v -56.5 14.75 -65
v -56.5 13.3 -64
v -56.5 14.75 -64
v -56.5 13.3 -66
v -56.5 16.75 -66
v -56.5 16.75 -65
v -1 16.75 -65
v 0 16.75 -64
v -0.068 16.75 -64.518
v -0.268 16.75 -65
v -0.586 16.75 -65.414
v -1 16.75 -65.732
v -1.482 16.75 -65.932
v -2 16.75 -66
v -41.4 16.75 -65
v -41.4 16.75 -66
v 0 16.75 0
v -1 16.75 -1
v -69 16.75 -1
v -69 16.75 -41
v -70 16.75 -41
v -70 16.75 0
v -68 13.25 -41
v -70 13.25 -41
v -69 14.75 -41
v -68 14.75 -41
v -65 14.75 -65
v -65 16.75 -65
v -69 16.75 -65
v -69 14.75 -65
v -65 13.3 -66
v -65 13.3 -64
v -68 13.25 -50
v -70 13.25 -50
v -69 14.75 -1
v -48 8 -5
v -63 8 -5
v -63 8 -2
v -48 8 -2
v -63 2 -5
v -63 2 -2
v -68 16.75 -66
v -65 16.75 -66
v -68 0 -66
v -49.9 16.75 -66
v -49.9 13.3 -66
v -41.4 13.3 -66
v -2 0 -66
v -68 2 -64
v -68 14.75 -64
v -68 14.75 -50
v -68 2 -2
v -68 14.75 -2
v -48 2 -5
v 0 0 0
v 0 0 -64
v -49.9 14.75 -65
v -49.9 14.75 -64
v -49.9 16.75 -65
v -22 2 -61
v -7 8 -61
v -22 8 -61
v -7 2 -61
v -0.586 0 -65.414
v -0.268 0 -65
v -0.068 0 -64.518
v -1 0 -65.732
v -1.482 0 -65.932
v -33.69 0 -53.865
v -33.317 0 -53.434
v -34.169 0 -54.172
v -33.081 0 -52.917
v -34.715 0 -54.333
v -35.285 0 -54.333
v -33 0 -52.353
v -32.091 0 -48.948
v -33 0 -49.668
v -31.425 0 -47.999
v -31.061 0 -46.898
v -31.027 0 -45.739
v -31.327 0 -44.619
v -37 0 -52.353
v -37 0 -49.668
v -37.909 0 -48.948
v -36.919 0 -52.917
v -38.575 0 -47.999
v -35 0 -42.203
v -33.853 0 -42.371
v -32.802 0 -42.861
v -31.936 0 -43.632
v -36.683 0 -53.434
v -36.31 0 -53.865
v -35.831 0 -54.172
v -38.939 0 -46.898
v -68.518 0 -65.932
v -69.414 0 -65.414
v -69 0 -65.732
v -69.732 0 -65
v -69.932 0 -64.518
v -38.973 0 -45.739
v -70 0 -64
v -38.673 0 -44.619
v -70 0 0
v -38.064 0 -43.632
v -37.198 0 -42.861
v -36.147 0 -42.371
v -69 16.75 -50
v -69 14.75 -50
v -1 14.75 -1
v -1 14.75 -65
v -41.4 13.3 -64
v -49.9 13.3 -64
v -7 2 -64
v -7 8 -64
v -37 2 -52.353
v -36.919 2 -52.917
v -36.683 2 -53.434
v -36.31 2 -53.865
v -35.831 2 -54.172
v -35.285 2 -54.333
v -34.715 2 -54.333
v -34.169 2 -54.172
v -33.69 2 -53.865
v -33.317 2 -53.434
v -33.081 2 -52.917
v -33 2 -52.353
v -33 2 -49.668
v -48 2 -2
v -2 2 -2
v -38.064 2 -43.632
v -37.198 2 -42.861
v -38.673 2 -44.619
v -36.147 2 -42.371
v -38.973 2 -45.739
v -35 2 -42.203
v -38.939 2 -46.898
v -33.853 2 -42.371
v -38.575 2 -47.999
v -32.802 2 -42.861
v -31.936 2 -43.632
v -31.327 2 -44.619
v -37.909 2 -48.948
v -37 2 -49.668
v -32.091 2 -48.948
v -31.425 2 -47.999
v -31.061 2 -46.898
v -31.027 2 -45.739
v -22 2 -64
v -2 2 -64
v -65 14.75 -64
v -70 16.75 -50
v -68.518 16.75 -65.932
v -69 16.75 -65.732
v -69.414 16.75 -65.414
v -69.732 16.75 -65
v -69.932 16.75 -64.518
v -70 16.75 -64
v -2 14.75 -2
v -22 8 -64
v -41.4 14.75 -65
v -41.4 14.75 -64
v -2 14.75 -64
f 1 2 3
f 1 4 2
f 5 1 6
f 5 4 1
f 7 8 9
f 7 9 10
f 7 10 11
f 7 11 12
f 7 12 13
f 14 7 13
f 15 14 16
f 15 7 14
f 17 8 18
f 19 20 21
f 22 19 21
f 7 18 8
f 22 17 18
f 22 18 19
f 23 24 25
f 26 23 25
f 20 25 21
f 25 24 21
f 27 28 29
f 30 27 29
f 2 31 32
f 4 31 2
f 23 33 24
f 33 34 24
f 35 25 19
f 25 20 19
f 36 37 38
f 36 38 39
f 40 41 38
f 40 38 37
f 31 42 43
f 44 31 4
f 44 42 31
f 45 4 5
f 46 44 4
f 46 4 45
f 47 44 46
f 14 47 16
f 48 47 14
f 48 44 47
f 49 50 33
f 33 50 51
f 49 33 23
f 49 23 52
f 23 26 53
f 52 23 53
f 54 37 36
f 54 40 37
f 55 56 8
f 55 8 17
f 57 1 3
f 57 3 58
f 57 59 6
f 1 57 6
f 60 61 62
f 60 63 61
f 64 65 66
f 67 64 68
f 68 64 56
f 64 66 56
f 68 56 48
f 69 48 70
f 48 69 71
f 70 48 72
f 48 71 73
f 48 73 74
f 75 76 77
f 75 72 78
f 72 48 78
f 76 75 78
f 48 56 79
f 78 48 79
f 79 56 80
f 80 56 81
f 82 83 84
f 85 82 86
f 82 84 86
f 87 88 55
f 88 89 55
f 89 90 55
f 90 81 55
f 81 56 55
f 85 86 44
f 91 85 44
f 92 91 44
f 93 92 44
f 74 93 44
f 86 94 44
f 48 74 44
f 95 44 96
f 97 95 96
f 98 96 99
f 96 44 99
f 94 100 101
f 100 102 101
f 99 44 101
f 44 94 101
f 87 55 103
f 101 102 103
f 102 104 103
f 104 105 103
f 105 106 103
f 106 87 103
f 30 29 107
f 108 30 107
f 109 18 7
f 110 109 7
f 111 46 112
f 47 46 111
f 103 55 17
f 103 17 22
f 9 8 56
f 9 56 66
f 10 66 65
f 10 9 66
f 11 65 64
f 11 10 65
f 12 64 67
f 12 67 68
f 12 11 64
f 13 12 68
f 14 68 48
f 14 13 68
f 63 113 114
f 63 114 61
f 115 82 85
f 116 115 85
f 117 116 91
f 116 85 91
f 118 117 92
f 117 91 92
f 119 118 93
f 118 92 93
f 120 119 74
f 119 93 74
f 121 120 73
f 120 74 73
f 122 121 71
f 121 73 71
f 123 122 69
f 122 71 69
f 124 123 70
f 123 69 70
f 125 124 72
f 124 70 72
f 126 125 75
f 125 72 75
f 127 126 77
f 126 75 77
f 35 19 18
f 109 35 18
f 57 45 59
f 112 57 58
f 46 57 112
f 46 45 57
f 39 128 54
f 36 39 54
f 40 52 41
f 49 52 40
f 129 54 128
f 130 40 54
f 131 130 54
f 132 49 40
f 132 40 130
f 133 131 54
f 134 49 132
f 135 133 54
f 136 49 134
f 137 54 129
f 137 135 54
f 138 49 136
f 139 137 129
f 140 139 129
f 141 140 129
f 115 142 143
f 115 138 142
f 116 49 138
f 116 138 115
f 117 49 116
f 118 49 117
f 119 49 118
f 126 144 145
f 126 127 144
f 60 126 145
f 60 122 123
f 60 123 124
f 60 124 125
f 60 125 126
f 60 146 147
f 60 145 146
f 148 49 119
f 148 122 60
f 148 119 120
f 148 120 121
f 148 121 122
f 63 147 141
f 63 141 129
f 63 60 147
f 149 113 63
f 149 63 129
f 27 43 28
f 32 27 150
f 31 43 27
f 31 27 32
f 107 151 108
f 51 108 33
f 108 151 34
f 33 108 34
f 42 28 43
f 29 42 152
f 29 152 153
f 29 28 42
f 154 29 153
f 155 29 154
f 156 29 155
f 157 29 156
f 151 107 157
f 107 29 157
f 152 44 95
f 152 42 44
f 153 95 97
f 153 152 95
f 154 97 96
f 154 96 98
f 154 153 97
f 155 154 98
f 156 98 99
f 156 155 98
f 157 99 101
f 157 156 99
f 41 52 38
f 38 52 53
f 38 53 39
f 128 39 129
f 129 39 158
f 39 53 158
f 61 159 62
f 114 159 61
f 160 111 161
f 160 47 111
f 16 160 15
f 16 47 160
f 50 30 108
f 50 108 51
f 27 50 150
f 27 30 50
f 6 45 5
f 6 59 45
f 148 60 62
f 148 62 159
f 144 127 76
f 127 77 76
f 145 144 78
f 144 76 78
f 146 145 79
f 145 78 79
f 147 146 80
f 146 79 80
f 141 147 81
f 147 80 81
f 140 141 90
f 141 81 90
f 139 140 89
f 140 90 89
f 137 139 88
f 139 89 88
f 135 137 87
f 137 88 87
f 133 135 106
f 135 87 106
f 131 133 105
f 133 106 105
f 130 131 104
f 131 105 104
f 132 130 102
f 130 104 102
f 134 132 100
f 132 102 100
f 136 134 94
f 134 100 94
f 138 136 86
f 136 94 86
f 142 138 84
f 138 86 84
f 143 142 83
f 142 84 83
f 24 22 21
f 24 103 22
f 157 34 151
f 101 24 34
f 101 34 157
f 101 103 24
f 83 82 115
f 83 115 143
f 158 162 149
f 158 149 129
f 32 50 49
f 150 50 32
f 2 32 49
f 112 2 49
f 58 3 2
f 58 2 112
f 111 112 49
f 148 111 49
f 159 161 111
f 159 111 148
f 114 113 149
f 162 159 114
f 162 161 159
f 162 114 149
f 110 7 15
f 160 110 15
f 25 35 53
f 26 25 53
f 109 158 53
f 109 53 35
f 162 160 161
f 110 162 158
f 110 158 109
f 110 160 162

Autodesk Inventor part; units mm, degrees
ref_plane "YZ Plane" through (0, 0, 0) normal (1, 0, 0) x (0, 1, 0)
ref_plane "XZ Plane" through (0, 0, 0) normal (0, 1, 0) x (-1, 0, 0)
ref_plane "XY Plane" through (0, 0, 0) normal (0, 0, 1) x (1, 0, 0)
sketch "Sketch1" plane through (0, 0, 0) normal (0, 1, 0) x (-1, 0, 0)
  point P0 (0, 0)
sketch "Sketch2" plane through (0, 0, 0) normal (0, 1, 0) x (-1, 0, 0)
  line L0 (0, 0) -> (70, 0)
  line L1 (70, 0) -> (70, -66)
  line L2 (70, -66) -> (0, -66)
  line L3 (0, -66) -> (0, 0)
  dimension "d0" = 70
  dimension "d1" = 66
extrude "Extrusion1" add sketch "Sketch2" along normal blind 16.75
sketch "Sketch3" plane through (0, 16.75, 0) normal (0, 1, 0) x (1, 0, 0)
  point P0 (0, 0)
sketch "Sketch4" plane through (0, 16.75, 0) normal (0, 1, 0) x (1, 0, 0)
  line L0 (0, 66) -> (-70, 66) projected
  line L1 (-30.4814, 66) -> (-28.4814, 66)
  line L2 (-28.4814, 66) -> (-28.4814, 64)
  line L3 (-70, 66) -> (-70, 0) projected
  line L4 (-70, 37.8423) -> (-70, 39.8423)
  line L5 (-70, 39.8423) -> (-68, 39.8423)
  line L6 (-70, 0) -> (0, 0) projected
  line L7 (-28.4814, 0) -> (-30.4814, 0)
  line L8 (-30.4814, 0) -> (-30.4814, 2)
  line L9 (0, 0) -> (0, 66) projected
  line L10 (0, 38.8423) -> (0, 36.8423)
  line L11 (0, 36.8423) -> (-2, 36.8423)
  line L12 (-2, 2) -> (-60, 2)
  line L13 (-2, 64) -> (-2, 2)
  line L14 (-68, 64) -> (-68, 2)
  line L15 (-68, 64) -> (-2, 64)
  line L16 (-68, 2) -> (-2, 2)
  dimension "d5" = 2
  dimension "d6" = 2
  dimension "d7" = 2
  dimension "d8" = 2
  dimension "d9" = 2
  dimension "d10" = 2
  dimension "d11" = 2
  dimension "d12" = 2
  dimension "d102" = 2
  dimension "d103" = 2
  dimension "d104" = 2
extrude "Extrusion2" cut sketch "Sketch4" against normal blind 14.75 contours L15 L13 L12 L16 L14
sketch "Sketch10" plane through (0, 2, 0) normal (0, 1, 0) x (1, 0, 0)
  line L0 (-2, 2) -> (-68, 2) projected
  line L1 (-31, 2) -> (-48, 2)
  line L2 (-48, 2) -> (-48, 5)
  line L3 (-48, 2) -> (-63, 2)
  line L4 (-63, 2) -> (-63, 5)
  line L5 (-63, 5) -> (-48, 5)
  line L6 (-48, 5) -> (-48, 2)
  line L7 (-22, 64) -> (-7, 64)
  line L8 (-7, 64) -> (-7, 61)
  line L9 (-7, 61) -> (-22, 61)
  line L10 (-22, 61) -> (-22, 64)
  line L11 (-68, 64) -> (-2, 64) projected
  line L12 (-68, 64) -> (-68, 2)
  line L13 (-63, 2) -> (-48, 2)
  point P0 (-48, 5)
  point P1 (-63, 2)
  point P2 (-48, 2)
  dimension "d55" = 3
  dimension "d56" = 15
  dimension "d60" = 15
  dimension "d108" = 3
extrude "Extrusion5" add sketch "Sketch10" along normal blind 6
sketch "Sketch12" plane through (0, 0, 0) normal (0, -1, 0) x (1, 0, 0)
  line L0 (0, 0) -> (0, -66) projected
  arc A0 (-33, -49.6675) -> (-33, -42.7393) centre (-35, -46.2034) ccw
  arc A1 (-37, -52.3532) -> (-33, -52.3532) centre (-35, -52.3532) ccw
  line L1 (-33, -52.3532) -> (-33, -49.6675)
  line L2 (-37, -52.3532) -> (-37, -49.6675)
  arc A2 (-33, -42.7393) -> (-37, -49.6675) centre (-35, -46.2034) ccw
extrude "Extrusion7" cut sketch "Sketch12" against normal blind 5
sketch "Sketch13" plane through (0, 16.75, 0) normal (0, 1, 0) x (1, 0, 0)
  line L0 (-70, 66) -> (-70, 0) projected
  line L1 (0, 0) -> (0, 66) projected
  line L2 (-69, 1) -> (-1, 1)
  line L3 (-1, 1) -> (-1, 65)
  line L4 (-1, 65) -> (-69, 65)
  line L5 (-69, 65) -> (-69, 1)
  line L6 (-70, 0) -> (0, 0) projected
  line L7 (0, 66) -> (-70, 66) projected
  line L8 (-68, 64) -> (-2, 64)
  line L9 (-2, 64) -> (-2, 2)
  line L10 (-2, 2) -> (-68, 2)
  line L11 (-68, 2) -> (-68, 64)
  dimension "d94" = 1
  dimension "d95" = 1
  dimension "d96" = 1
  dimension "d97" = 1
  dimension "d98" = 1
  dimension "d99" = 1
  dimension "d100" = 1
  dimension "d101" = 1
extrude "Extrusion8" cut sketch "Sketch13" against normal blind 2 contours L5 L4 L3 L2 | L8 L9 L10 L11
sketch "Sketch15" plane through (-70, 0, -66) normal (-1, 0, 0) x (0, 0, 1)
  line L0 (62.4242, 8) -> (52.7396, 8)
  line L1 (0, 0) -> (66, 0) projected
  line L2 (0, 16.75) -> (66, 16.75) projected
  line L3 (0, 0) -> (0, 16.75) projected
  line L4 (16, 13.25) -> (25, 13.25)
  line L5 (25, 13.25) -> (25, 18.25)
  line L6 (25, 18.25) -> (16, 18.25)
  line L7 (16, 18.25) -> (16, 13.25)
  dimension "d118" = 8
  dimension "d140" = 25
  dimension "d141" = 9
  dimension "d142" = 3.5
  dimension "d143" = 5
extrude "Extrusion9" cut sketch "Sketch15" against normal blind 10
sketch "Sketch16" plane through (0, 0, -66) normal (0, 0, -1) x (-1, 0, 0)
  line L0 (41.4, 16.8) -> (49.9, 16.8)
  line L1 (49.9, 16.8) -> (49.9, 13.3)
  line L2 (49.9, 13.3) -> (41.4, 13.3)
  line L3 (41.4, 13.3) -> (41.4, 16.8)
  line L4 (56.5, 16.8) -> (65, 16.8)
  line L5 (65, 16.8) -> (65, 13.3)
  line L6 (65, 13.3) -> (56.5, 13.3)
  line L7 (56.5, 13.3) -> (56.5, 16.8)
  line L8 (22, 8) -> (7, 8) projected
  line L9 (70, 0) -> (70, 16.75) projected
  point P0 (0, 0)
  dimension "d127" = 8.5
  dimension "d128" = 8.5
  dimension "d129" = 3.5
  dimension "d130" = 5.3
  dimension "d131" = 28.6
  dimension "d132" = 13.5
extrude "Extrusion10" cut sketch "Sketch16" against normal blind 10
fillet "Fillet7" radius 2 1 edges at (0, 8.375, -66)
fillet "Fillet8" radius 2 1 edges at (-70, 8.375, -66)
properties part number "Shell 2 bottom"
